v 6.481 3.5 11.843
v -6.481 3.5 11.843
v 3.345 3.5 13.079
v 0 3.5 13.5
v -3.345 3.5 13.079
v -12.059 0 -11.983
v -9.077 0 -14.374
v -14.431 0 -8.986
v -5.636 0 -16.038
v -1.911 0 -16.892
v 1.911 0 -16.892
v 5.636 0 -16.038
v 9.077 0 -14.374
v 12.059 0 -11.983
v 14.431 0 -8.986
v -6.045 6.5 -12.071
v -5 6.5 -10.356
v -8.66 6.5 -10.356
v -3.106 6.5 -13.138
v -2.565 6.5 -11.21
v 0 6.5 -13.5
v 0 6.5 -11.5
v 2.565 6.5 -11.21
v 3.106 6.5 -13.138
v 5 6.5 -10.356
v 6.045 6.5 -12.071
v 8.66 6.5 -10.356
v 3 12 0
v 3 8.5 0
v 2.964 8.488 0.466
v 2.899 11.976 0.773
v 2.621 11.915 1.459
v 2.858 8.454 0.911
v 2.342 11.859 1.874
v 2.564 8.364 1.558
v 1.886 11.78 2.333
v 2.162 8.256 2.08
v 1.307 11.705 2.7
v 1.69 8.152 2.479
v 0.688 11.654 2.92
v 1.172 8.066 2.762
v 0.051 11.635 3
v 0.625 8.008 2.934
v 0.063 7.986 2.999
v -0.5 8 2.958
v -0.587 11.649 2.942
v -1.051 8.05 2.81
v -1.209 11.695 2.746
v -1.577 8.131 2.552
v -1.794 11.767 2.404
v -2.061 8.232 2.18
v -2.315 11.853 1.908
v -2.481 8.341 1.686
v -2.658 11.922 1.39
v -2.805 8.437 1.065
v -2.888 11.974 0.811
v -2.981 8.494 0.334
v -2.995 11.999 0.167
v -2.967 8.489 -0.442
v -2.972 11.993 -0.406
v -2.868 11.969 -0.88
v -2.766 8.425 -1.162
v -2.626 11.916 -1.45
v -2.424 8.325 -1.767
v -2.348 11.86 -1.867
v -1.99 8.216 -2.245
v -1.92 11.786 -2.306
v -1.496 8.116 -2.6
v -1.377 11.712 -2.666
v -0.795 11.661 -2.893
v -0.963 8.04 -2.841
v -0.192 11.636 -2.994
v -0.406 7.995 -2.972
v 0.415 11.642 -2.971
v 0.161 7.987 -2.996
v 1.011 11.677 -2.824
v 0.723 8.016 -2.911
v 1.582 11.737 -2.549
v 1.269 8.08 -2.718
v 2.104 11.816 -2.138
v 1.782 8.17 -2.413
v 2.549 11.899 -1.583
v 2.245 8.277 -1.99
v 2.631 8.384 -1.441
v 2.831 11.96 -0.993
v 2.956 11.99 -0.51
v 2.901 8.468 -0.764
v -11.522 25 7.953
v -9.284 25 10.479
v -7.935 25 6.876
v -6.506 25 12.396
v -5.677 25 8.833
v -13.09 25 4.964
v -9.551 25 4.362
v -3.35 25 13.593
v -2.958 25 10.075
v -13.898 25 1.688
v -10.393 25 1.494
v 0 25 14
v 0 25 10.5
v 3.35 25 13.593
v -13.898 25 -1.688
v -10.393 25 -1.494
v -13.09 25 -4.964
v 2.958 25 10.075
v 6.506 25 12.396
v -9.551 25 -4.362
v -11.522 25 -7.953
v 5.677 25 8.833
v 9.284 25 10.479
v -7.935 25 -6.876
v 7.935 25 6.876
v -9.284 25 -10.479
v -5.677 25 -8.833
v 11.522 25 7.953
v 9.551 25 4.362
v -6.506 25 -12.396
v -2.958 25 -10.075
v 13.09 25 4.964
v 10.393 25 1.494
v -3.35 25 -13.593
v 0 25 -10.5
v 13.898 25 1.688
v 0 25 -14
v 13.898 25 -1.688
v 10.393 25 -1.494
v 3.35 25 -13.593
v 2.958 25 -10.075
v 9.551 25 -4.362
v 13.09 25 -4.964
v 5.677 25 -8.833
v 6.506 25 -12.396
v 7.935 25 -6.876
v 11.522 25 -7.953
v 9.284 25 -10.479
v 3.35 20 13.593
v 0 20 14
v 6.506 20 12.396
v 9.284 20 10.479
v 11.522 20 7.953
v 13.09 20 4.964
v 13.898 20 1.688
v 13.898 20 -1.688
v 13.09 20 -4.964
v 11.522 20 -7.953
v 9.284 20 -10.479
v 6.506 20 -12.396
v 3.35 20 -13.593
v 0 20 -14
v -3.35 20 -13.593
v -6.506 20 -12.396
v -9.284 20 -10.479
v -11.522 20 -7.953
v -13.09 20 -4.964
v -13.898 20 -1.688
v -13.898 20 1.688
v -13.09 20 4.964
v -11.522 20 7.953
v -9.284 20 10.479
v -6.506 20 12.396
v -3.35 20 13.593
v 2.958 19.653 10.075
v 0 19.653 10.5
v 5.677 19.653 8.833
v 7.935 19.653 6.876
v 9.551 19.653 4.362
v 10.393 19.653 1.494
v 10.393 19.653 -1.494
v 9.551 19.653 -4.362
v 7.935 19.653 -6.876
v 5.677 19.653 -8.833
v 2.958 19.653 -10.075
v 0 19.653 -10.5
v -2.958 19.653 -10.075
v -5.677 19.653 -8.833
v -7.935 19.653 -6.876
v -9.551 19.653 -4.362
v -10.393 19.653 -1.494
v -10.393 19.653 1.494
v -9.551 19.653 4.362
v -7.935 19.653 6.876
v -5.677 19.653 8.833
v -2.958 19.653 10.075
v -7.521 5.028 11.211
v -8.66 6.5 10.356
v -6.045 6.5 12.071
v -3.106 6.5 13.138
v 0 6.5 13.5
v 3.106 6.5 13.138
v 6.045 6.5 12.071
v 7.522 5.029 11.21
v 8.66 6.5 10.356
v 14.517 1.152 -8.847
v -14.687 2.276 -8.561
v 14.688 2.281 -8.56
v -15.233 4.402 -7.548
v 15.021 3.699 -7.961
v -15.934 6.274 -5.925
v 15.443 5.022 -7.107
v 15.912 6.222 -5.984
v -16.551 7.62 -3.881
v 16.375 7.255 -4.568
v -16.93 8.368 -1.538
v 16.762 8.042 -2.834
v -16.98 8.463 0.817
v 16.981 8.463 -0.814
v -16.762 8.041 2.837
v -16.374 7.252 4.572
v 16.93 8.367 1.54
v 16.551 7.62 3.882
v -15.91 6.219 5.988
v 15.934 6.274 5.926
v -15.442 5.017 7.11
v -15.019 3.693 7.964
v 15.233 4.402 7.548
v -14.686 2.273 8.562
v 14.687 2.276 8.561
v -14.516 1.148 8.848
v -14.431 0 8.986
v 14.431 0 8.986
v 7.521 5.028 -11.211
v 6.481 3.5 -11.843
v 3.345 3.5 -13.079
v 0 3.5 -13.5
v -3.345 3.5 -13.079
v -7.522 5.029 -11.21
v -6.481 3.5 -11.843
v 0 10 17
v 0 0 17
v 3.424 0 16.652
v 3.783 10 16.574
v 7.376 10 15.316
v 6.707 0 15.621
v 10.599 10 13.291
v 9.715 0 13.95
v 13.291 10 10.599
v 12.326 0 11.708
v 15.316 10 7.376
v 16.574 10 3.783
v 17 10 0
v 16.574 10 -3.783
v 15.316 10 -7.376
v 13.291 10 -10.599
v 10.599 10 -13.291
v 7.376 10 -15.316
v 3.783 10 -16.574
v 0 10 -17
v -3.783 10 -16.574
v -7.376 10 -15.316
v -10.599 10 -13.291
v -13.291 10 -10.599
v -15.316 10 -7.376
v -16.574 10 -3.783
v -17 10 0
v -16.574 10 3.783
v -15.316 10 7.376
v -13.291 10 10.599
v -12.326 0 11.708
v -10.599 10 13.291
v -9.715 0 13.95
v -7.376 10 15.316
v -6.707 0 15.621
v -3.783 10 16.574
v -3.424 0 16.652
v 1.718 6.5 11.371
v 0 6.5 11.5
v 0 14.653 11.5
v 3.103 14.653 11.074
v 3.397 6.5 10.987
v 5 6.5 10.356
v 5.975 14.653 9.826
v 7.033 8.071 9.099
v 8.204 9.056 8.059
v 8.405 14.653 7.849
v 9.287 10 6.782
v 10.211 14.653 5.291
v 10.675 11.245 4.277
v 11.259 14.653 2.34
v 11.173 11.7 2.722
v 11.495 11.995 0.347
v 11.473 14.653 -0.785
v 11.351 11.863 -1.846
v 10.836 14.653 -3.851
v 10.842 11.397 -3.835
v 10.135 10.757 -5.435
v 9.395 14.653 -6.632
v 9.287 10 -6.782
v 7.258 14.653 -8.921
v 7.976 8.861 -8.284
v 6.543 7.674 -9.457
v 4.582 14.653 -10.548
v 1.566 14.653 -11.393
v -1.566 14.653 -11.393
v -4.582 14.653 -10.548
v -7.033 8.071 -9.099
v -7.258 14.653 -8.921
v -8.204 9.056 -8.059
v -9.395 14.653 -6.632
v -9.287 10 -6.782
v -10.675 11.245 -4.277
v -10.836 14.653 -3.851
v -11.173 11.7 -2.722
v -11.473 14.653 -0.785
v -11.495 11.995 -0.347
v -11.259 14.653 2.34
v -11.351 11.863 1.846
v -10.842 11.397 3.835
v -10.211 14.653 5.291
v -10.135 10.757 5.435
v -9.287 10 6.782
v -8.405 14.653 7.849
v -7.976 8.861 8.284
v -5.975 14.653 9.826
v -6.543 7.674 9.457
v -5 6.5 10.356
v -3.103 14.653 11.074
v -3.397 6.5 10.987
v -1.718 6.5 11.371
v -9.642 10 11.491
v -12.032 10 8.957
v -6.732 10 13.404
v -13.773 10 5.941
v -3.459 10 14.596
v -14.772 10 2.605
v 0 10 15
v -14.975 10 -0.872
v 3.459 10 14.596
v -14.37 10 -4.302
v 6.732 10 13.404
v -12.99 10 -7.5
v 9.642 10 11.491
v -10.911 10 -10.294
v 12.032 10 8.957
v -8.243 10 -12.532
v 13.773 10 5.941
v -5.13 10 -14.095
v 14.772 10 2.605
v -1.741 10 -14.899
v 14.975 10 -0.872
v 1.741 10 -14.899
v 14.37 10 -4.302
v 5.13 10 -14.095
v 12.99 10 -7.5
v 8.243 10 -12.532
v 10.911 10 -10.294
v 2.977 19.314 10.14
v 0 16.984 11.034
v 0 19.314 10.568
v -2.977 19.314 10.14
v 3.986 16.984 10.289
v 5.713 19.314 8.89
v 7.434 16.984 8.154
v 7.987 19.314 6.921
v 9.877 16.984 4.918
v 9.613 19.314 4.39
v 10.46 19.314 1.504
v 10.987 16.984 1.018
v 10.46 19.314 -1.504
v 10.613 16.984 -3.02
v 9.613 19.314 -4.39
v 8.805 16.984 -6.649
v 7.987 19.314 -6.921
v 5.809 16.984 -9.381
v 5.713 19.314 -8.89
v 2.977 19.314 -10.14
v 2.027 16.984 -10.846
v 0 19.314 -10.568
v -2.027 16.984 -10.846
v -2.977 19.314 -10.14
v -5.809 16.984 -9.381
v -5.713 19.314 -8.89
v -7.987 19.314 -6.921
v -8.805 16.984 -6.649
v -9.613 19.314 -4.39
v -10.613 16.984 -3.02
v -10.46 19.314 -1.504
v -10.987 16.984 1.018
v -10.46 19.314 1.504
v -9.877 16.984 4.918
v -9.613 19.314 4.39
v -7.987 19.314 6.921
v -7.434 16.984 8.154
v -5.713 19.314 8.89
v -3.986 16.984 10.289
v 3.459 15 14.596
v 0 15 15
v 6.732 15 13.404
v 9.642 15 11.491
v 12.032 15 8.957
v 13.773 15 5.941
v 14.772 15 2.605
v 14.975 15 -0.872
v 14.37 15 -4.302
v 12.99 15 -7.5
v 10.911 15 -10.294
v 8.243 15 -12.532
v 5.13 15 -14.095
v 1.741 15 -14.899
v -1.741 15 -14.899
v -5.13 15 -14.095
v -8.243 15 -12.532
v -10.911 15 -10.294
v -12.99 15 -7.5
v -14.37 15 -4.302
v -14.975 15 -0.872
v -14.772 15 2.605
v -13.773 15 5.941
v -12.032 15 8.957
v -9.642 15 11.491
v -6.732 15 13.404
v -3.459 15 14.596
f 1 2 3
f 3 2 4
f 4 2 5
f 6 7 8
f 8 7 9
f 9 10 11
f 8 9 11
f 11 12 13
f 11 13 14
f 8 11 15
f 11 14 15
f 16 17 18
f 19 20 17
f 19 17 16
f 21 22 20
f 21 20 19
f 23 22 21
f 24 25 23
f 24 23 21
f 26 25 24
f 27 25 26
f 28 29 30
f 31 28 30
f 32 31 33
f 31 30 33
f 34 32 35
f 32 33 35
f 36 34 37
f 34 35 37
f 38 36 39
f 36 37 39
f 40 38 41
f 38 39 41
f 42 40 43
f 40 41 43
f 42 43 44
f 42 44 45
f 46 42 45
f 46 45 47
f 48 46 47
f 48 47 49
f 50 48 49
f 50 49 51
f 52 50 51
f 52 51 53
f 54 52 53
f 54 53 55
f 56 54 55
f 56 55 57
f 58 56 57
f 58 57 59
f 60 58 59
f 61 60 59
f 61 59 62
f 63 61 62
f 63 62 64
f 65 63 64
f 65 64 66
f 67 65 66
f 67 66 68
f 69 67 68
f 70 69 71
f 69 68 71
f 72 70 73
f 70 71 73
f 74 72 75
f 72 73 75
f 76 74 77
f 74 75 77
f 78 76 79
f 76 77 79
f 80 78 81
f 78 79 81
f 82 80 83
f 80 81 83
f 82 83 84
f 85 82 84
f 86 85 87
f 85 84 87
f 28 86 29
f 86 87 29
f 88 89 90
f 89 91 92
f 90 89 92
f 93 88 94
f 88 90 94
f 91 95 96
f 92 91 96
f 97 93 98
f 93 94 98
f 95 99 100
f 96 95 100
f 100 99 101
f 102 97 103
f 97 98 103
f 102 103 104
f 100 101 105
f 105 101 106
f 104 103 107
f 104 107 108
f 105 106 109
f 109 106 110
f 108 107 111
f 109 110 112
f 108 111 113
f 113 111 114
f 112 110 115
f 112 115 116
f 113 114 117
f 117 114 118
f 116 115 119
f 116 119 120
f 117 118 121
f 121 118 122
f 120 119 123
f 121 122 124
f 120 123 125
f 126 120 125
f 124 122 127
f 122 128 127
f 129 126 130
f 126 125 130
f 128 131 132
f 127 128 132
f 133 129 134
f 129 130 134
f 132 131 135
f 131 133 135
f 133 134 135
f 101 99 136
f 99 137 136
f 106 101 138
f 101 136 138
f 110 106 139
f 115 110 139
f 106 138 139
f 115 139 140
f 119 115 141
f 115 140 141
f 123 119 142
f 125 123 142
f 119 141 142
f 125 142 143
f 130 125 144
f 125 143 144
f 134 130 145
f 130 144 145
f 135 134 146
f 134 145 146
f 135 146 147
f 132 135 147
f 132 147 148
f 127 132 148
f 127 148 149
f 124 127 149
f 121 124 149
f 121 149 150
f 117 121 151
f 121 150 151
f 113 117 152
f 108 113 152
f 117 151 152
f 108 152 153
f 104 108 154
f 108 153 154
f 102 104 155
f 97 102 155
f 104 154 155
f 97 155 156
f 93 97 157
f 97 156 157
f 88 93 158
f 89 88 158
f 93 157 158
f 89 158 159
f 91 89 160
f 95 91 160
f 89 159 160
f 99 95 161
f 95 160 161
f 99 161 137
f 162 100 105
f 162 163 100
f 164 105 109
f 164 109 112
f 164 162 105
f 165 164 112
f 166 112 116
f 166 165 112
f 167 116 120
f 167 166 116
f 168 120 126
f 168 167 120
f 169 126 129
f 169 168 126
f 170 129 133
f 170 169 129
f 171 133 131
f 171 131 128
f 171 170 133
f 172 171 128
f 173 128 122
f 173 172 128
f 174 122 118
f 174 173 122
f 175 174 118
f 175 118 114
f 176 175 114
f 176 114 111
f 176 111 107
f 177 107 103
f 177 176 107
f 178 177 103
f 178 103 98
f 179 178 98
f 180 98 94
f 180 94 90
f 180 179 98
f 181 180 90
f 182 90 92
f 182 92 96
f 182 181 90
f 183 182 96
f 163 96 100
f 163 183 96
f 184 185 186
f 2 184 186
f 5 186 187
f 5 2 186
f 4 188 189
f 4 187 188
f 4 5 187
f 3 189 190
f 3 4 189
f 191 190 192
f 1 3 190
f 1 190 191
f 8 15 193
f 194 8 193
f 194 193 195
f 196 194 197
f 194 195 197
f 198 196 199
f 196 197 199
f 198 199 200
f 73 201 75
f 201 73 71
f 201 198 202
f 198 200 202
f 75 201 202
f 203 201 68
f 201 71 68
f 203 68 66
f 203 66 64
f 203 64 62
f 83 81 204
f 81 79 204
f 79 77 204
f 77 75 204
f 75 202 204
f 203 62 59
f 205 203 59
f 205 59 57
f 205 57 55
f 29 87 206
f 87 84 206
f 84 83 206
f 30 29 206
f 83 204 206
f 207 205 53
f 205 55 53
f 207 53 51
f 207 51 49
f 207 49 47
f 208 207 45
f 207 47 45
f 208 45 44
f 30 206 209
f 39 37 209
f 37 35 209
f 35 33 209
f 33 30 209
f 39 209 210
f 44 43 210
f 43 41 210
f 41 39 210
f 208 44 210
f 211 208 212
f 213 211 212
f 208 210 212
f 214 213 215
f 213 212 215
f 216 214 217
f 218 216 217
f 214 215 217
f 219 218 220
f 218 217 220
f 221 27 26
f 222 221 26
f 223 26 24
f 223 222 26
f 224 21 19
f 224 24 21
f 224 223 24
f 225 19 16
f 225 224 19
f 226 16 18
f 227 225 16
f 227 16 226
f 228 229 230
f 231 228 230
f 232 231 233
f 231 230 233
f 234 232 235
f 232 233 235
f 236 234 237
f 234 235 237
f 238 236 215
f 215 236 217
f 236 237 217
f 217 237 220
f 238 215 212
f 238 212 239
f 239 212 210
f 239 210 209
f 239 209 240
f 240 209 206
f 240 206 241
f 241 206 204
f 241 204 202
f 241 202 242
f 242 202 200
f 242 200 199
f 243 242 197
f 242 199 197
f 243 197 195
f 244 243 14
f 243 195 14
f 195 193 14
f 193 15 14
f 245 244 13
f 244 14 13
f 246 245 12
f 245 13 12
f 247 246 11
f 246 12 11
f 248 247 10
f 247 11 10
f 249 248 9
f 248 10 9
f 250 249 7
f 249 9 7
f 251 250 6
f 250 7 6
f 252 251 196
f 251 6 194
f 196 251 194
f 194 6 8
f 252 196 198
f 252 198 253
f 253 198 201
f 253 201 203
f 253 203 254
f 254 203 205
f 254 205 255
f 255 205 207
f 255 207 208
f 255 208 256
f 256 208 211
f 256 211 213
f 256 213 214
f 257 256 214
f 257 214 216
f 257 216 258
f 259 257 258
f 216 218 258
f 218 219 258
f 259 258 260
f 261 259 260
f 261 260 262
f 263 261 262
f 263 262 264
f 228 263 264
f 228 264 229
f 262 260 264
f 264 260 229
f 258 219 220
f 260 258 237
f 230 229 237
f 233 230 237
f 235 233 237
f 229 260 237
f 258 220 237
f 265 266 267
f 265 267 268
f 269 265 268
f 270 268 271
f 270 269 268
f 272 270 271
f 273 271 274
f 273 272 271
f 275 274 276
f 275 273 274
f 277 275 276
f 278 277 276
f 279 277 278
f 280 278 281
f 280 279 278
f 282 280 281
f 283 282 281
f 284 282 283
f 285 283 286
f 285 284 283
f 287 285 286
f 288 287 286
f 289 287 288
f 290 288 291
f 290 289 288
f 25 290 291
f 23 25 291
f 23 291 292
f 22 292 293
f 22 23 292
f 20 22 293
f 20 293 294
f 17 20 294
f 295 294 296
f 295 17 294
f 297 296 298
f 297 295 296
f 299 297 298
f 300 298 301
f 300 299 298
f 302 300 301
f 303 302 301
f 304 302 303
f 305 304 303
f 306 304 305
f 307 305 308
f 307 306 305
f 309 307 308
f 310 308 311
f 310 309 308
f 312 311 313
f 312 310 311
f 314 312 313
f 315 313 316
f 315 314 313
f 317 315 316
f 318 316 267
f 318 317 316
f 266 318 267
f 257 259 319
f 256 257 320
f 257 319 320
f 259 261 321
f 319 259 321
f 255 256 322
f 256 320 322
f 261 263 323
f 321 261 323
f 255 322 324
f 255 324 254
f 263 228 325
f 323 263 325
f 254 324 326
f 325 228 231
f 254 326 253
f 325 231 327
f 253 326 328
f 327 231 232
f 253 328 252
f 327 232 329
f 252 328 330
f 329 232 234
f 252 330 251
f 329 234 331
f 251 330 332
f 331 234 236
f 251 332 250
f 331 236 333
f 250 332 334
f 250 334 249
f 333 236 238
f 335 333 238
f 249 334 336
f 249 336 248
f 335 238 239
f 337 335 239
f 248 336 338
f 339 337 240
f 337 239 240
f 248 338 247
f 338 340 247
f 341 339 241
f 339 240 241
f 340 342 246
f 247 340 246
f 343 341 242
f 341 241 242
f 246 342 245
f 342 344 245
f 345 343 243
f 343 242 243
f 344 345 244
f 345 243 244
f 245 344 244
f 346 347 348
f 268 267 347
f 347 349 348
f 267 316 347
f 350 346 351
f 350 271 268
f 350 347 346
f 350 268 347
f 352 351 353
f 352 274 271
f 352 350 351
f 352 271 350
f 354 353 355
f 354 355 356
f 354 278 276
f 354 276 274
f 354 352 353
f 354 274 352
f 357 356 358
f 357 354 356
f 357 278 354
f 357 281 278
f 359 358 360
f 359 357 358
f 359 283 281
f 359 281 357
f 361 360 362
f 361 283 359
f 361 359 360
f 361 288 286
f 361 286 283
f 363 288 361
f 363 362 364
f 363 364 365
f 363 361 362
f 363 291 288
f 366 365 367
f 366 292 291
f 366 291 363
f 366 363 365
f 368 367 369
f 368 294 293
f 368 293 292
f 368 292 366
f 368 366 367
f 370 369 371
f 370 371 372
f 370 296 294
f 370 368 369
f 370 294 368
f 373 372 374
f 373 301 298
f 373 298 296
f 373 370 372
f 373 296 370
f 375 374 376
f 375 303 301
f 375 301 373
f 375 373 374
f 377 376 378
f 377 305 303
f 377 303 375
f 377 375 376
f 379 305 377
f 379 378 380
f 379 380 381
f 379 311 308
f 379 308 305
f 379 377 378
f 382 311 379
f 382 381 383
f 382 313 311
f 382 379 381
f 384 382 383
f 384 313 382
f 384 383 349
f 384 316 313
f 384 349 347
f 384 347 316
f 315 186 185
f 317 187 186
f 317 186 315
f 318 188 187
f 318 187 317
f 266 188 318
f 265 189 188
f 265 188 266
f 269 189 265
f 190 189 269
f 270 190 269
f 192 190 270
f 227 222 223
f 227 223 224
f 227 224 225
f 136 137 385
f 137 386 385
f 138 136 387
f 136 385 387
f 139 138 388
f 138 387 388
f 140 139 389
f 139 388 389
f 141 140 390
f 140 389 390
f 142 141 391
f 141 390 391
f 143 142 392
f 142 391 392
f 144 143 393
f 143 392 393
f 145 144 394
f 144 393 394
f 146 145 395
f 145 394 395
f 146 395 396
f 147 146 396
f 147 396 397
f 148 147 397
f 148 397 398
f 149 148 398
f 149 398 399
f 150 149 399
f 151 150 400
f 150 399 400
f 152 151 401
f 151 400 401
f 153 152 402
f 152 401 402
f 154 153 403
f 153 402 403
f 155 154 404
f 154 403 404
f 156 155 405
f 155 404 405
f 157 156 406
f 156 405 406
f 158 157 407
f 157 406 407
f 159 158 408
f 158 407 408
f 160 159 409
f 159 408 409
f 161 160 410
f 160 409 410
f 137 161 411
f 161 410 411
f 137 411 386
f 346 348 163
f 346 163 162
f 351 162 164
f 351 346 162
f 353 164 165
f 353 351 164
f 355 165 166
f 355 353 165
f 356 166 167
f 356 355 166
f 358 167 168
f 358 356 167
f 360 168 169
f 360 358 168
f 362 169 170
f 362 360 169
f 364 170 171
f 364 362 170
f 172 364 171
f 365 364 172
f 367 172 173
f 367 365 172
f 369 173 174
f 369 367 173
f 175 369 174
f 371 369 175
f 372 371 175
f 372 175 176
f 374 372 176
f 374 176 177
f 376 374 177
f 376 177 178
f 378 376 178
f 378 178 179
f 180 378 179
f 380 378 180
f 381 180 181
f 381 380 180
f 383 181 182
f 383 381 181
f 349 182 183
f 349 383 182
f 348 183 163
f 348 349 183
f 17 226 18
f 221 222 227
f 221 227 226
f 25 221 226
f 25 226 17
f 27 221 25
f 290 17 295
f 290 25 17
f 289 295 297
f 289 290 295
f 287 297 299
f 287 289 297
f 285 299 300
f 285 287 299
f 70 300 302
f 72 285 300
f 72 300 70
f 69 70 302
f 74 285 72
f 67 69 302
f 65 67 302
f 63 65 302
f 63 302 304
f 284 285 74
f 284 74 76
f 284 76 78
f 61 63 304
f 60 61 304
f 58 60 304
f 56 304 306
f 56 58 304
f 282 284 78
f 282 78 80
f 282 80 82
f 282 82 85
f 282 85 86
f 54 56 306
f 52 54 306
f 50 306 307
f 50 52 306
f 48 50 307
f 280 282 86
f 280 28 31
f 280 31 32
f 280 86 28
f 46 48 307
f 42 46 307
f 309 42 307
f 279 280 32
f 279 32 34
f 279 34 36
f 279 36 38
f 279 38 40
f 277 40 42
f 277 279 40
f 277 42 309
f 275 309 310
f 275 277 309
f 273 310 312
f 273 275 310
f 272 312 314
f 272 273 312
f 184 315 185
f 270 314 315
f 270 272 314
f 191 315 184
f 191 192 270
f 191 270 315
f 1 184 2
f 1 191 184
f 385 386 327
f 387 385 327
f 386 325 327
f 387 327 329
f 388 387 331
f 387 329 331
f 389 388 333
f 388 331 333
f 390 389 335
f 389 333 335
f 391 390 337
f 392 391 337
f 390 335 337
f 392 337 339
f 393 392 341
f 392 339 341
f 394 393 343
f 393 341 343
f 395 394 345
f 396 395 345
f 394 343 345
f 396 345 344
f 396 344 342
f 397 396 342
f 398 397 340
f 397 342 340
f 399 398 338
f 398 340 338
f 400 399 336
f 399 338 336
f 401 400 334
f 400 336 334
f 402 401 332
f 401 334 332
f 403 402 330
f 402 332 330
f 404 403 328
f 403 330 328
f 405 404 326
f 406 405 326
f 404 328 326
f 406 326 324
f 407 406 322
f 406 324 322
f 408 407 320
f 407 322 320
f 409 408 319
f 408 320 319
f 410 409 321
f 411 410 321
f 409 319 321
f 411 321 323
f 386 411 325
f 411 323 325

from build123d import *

# Parameters (mm, degrees)
F2_R     = 9
F3_DEPTH = 25
F5_T     = 3.5
F6_D     = 6


# Not quite as in the source:
# - a shell that OpenCascade refuses in one call is made with other operations: the cavity is built on its own and cut out


with BuildPart() as f1:
    # F0 (on Right) → F1 (revolve)
    with BuildSketch(Plane.YZ):
        Polygon((0, 0), (25, 0), (25, 14), (20, 14), (15, 15), (10, 15), (10, 17), (0, 17), align=None)
    revolve(axis=Axis((0, 12.5, 0), (0, 1, 0)))

    # F2 (on Right) → F3 (cut, symmetric)
    with BuildSketch(Plane.YZ):
        with Locations((-0.5, 0)):
            Circle(F2_R)
    extrude(amount=F3_DEPTH, both=True, mode=Mode.SUBTRACT)

    # F5: shell of thickness 3.5, made by hand


with BuildPart() as f5_core1:
    # F5_t2: copy of F1
    add(f1.part)

    # the walls: a layer under each face that stays
    f5_faces = [f5_core1.faces().sort_by_distance(p)[0] for p in [
        (0, 22.5, -14),
        (0, 17.5, -14.5),
        (0, 12.5, -15),
        (-11.3333333333, 10, 11.3333333333),
        (0, 5, -17),
        (0, 0, -12.9930501889),
        (0, 8.5, 0),
        (0, 0, 12.9930501889),
    ]]
    thicken(f5_faces, amount=-F5_T, mode=Mode.SUBTRACT)

    # F5_s3 → F5_t4 (revolve, cut)
    with BuildSketch(Plane.YZ):
        Polygon((20.0068640647, 14.0693203236), (20, 10.5), (19.6534317024, 10.5), (19.313593527, 10.5679676351), align=None)
    revolve(axis=Axis((0, 20, 0), (0, 1, 0)), mode=Mode.SUBTRACT)

    # F5_s5 → F5_t6 (revolve, cut)
    with BuildSketch(Plane.YZ):
        Polygon((10.035, 15.035), (10, 11.5), (6.5, 11.5), (6.5, 15), align=None)
    revolve(axis=Axis((0, 10, 0), (0, 1, 0)), mode=Mode.SUBTRACT)


with BuildPart() as f1_1:
    add(f1.part)

    # what is left inside the walls is the cavity
    f5_cavity = [f5_core1.part.solids().sort_by_distance(p)[0] for p in [
        (-3.834029, 12.035, 0),
    ]]
    add(f5_cavity, mode=Mode.SUBTRACT)

    # F6 (through all)
    with Locations(Plane(origin=(0, 25, 0), x_dir=(-1, 0, 0), z_dir=(0, 1, 0))):
        with Locations((0, 0)):
            Hole(F6_D / 2)


solid = f1_1.part
